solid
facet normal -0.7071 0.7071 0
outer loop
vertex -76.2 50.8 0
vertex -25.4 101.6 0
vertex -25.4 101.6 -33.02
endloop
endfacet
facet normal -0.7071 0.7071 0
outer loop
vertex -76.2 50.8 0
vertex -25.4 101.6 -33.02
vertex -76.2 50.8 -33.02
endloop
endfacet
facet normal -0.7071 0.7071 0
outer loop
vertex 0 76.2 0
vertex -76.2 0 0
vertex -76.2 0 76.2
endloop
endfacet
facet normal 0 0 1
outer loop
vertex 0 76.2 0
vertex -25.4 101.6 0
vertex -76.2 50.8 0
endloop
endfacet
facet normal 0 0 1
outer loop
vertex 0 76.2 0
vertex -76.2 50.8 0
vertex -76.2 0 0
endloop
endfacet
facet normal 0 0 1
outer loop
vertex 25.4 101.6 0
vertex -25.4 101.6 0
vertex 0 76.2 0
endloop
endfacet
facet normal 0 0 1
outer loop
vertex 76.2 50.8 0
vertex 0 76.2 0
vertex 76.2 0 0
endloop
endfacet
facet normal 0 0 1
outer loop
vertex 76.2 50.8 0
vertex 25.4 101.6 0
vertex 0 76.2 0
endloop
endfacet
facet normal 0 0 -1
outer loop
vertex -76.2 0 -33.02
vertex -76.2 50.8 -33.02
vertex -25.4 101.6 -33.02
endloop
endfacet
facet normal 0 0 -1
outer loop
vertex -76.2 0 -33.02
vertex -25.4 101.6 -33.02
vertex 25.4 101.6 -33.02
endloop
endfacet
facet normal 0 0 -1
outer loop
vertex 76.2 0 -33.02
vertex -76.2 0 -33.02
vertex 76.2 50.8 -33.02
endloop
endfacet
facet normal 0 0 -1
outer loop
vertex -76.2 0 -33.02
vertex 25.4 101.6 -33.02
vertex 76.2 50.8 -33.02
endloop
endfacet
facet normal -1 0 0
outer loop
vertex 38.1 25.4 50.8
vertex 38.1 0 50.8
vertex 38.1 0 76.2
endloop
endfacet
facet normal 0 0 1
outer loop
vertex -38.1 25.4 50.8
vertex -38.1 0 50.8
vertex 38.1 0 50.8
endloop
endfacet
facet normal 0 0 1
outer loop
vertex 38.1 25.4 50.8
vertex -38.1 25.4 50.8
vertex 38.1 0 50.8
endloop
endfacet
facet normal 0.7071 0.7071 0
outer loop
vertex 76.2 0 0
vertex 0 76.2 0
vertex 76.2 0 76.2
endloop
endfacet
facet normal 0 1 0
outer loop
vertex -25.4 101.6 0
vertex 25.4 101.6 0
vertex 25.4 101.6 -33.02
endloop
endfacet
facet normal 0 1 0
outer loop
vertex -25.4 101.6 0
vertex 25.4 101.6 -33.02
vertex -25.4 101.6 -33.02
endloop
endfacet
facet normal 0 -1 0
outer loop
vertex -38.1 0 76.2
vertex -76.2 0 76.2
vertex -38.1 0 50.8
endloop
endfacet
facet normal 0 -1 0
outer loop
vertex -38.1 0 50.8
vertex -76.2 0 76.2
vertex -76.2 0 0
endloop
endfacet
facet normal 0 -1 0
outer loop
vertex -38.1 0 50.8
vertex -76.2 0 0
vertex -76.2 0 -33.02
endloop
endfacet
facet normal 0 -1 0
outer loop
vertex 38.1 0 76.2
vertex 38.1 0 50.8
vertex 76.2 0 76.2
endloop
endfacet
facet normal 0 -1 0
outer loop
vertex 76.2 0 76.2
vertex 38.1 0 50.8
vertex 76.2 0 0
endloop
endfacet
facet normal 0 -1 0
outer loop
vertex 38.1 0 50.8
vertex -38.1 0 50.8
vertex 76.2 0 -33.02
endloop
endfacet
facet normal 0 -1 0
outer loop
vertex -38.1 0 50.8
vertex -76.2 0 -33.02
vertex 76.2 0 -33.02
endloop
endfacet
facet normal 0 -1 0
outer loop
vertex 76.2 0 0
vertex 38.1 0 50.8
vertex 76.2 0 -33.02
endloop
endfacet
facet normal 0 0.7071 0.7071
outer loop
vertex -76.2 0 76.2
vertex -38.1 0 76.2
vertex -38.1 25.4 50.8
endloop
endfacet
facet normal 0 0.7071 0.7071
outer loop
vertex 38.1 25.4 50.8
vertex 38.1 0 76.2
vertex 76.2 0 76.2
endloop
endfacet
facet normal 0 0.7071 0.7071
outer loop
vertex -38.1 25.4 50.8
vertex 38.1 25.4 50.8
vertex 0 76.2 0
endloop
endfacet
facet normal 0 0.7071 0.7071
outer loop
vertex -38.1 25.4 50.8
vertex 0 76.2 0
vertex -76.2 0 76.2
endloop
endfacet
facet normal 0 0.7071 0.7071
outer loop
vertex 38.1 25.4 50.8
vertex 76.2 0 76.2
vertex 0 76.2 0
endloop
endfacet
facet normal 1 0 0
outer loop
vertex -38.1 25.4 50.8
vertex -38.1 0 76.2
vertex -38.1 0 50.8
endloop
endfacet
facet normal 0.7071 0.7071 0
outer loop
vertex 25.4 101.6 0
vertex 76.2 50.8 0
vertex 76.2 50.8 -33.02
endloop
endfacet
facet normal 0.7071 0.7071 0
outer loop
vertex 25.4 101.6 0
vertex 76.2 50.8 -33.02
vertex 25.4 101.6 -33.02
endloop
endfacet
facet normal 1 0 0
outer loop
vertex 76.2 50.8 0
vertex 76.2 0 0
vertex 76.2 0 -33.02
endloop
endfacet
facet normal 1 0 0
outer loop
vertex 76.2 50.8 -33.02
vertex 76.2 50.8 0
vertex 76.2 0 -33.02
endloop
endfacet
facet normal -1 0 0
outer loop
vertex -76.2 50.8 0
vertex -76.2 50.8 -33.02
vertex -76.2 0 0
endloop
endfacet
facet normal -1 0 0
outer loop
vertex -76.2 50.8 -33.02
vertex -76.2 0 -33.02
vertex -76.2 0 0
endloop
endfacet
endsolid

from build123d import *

# Parameters (mm, degrees)
BOSS_EXTRUDE1_DEPTH     = 33.02
BOSS_EXTRUDE2_DEPTH     = 76.2
CUT_EXTRUDE1_REACH      = 150.106
CUT_EXTRUDE2_DEPTH      = 149.106178129
CUT_EXTRUDE2_DEPTH_BACK = 149.106178129


with BuildPart() as part:
    # Sketch1 → Boss-Extrude1 (new body)
    with BuildSketch(Plane.XY):
        Polygon((-76.2, 50.8), (-76.2, 0), (0, 76.2), (0, 101.6), (-25.4, 101.6), align=None)
        Polygon((0, 101.6), (0, 76.2), (76.2, 0), (76.2, 50.8), (25.4, 101.6), align=None)
        Polygon((0, 76.2), (0, 0), (76.2, 0), align=None)
        Polygon((0, 76.2), (-76.2, 0), (0, 0), align=None)
    extrude(amount=-BOSS_EXTRUDE1_DEPTH)

    # Sketch2 → Boss-Extrude2 (add)
    with BuildSketch(Plane(origin=(0, 0, 0), x_dir=(1, 0, 0), z_dir=(0, 1, 0))):
        Polygon((-76.2, 0), (-76.2, -76.2), (-38.1, -76.2), (-38.1, -50.8), (38.1, -50.8), (38.1, -76.2), (76.2, -76.2), (76.2, 0), align=None)
    extrude(amount=BOSS_EXTRUDE2_DEPTH)

    # Sketch1<5> → Cut-Extrude1 (cut, up to next)
    with BuildSketch(Plane.XY, mode=Mode.PRIVATE) as cut_extrude1_sk1:
        Polygon((-76.2, 50.8), (-76.2, 0), (0, 76.2), (0, 101.6), (-25.4, 101.6), align=None)
    cut_extrude1_tool1 = extrude(cut_extrude1_sk1.sketch, amount=CUT_EXTRUDE1_REACH, mode=Mode.PRIVATE) & part.part
    # Sketch1<5> → Cut-Extrude1 (cut, up to next)
    with BuildSketch(Plane.XY, mode=Mode.PRIVATE) as cut_extrude1_sk2:
        Polygon((0, 101.6), (0, 76.2), (76.2, 0), (76.2, 50.8), (25.4, 101.6), align=None)
    cut_extrude1_tool2 = extrude(cut_extrude1_sk2.sketch, amount=CUT_EXTRUDE1_REACH, mode=Mode.PRIVATE) & part.part
    add(cut_extrude1_tool1.solids().sort_by_distance((-40.793939, 59.266667, 0))[0], mode=Mode.SUBTRACT)
    add(cut_extrude1_tool2.solids().sort_by_distance((40.793939, 59.266667, 0))[0], mode=Mode.SUBTRACT)


with BuildPart() as body_2:
    # of the pieces the cut leaves, the one that is kept (cut_extrude1_keep)
    add(part.part.solids().sort_by_distance((-25.4, 101.6, 0))[0])

    # Sketch6 → Cut-Extrude2 (cut, two sides)
    with BuildSketch(Plane(origin=(0, 0, 0), x_dir=(0, 0, -1), z_dir=(1, 0, 0))) as cut_extrude2_sk:
        Polygon((-76.2, 0), (0, 76.2), (-76.2, 76.2), align=None)
    extrude(amount=CUT_EXTRUDE2_DEPTH, mode=Mode.SUBTRACT)
    extrude(cut_extrude2_sk.sketch, amount=-CUT_EXTRUDE2_DEPTH_BACK, mode=Mode.SUBTRACT)


solid = body_2.part
